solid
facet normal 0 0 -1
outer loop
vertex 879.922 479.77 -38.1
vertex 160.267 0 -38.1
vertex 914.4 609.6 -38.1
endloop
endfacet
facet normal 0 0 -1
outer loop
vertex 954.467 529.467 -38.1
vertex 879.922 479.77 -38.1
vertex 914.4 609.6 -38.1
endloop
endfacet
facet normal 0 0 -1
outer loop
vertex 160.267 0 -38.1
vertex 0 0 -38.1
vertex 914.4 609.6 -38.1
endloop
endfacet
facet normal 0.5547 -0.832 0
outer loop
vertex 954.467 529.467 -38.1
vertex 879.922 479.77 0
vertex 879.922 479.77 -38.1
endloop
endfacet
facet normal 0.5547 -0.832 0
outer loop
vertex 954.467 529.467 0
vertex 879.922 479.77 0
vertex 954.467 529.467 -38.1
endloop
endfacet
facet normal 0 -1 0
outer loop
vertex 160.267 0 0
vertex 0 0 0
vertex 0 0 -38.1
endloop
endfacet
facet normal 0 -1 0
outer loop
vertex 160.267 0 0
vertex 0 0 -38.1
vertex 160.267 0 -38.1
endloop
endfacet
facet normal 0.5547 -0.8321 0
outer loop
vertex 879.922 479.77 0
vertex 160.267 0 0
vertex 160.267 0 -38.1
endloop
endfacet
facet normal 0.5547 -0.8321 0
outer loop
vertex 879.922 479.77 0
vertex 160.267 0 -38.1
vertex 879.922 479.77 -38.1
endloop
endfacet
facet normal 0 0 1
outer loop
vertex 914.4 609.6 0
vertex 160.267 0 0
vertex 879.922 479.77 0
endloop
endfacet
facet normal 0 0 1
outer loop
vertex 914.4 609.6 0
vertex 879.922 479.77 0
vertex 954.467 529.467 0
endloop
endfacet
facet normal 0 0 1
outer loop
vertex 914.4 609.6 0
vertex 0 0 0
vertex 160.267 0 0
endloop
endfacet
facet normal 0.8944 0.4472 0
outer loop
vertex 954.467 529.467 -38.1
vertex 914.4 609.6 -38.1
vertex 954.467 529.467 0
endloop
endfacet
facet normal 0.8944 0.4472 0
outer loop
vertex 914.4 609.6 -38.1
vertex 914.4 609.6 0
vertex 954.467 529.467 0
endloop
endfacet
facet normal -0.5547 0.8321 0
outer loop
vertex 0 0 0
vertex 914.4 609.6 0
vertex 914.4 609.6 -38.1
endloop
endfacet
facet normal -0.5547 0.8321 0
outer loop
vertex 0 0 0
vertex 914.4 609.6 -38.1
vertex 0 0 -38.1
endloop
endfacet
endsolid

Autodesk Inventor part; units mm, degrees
ref_plane "YZ Plane" through (0, 0, 0) normal (1, 0, 0) x (0, 1, 0)
ref_plane "XZ Plane" through (0, 0, 0) normal (0, 1, 0) x (-1, 0, 0)
ref_plane "XY Plane" through (0, 0, 0) normal (0, 0, 1) x (1, 0, 0)
sketch "Sketch1" plane through (0, 0, 0) normal (0, 0, 1) x (1, 0, 0)
  line L0 (0, 0) -> (0, -38.1) projected
  line L1 (0, -38.1) -> (1219.2, -38.1) projected
  line L2 (1219.2, 0) -> (1219.2, -38.1) projected
  line L3 (0, 0) -> (1219.2, 0) projected
  line L4 (0, 0) -> (914.4, 0)
  line L5 (914.4, 609.6) -> (0, 0)
  line L6 (914.4, 609.6) -> (1219.2, 0)
  line L7 (1219.2, 0) -> (1126.19, 0)
  line L8 (1119.8068, 0) -> (879.9218, 479.77)
  line L9 (1119.8068, 0) -> (1219.2, 0)
  line L10 (160.2668, 0) -> (879.9218, 479.77)
  line L11 (879.9218, 479.77) -> (954.4667, 529.4666)
  dimension "d3" = 88.9
extrude "Extrusion1" add sketch "Sketch1" against normal blind 38.1 contours L5 L6 L11 L10 L3
properties part number "S_2x4x43.267"
